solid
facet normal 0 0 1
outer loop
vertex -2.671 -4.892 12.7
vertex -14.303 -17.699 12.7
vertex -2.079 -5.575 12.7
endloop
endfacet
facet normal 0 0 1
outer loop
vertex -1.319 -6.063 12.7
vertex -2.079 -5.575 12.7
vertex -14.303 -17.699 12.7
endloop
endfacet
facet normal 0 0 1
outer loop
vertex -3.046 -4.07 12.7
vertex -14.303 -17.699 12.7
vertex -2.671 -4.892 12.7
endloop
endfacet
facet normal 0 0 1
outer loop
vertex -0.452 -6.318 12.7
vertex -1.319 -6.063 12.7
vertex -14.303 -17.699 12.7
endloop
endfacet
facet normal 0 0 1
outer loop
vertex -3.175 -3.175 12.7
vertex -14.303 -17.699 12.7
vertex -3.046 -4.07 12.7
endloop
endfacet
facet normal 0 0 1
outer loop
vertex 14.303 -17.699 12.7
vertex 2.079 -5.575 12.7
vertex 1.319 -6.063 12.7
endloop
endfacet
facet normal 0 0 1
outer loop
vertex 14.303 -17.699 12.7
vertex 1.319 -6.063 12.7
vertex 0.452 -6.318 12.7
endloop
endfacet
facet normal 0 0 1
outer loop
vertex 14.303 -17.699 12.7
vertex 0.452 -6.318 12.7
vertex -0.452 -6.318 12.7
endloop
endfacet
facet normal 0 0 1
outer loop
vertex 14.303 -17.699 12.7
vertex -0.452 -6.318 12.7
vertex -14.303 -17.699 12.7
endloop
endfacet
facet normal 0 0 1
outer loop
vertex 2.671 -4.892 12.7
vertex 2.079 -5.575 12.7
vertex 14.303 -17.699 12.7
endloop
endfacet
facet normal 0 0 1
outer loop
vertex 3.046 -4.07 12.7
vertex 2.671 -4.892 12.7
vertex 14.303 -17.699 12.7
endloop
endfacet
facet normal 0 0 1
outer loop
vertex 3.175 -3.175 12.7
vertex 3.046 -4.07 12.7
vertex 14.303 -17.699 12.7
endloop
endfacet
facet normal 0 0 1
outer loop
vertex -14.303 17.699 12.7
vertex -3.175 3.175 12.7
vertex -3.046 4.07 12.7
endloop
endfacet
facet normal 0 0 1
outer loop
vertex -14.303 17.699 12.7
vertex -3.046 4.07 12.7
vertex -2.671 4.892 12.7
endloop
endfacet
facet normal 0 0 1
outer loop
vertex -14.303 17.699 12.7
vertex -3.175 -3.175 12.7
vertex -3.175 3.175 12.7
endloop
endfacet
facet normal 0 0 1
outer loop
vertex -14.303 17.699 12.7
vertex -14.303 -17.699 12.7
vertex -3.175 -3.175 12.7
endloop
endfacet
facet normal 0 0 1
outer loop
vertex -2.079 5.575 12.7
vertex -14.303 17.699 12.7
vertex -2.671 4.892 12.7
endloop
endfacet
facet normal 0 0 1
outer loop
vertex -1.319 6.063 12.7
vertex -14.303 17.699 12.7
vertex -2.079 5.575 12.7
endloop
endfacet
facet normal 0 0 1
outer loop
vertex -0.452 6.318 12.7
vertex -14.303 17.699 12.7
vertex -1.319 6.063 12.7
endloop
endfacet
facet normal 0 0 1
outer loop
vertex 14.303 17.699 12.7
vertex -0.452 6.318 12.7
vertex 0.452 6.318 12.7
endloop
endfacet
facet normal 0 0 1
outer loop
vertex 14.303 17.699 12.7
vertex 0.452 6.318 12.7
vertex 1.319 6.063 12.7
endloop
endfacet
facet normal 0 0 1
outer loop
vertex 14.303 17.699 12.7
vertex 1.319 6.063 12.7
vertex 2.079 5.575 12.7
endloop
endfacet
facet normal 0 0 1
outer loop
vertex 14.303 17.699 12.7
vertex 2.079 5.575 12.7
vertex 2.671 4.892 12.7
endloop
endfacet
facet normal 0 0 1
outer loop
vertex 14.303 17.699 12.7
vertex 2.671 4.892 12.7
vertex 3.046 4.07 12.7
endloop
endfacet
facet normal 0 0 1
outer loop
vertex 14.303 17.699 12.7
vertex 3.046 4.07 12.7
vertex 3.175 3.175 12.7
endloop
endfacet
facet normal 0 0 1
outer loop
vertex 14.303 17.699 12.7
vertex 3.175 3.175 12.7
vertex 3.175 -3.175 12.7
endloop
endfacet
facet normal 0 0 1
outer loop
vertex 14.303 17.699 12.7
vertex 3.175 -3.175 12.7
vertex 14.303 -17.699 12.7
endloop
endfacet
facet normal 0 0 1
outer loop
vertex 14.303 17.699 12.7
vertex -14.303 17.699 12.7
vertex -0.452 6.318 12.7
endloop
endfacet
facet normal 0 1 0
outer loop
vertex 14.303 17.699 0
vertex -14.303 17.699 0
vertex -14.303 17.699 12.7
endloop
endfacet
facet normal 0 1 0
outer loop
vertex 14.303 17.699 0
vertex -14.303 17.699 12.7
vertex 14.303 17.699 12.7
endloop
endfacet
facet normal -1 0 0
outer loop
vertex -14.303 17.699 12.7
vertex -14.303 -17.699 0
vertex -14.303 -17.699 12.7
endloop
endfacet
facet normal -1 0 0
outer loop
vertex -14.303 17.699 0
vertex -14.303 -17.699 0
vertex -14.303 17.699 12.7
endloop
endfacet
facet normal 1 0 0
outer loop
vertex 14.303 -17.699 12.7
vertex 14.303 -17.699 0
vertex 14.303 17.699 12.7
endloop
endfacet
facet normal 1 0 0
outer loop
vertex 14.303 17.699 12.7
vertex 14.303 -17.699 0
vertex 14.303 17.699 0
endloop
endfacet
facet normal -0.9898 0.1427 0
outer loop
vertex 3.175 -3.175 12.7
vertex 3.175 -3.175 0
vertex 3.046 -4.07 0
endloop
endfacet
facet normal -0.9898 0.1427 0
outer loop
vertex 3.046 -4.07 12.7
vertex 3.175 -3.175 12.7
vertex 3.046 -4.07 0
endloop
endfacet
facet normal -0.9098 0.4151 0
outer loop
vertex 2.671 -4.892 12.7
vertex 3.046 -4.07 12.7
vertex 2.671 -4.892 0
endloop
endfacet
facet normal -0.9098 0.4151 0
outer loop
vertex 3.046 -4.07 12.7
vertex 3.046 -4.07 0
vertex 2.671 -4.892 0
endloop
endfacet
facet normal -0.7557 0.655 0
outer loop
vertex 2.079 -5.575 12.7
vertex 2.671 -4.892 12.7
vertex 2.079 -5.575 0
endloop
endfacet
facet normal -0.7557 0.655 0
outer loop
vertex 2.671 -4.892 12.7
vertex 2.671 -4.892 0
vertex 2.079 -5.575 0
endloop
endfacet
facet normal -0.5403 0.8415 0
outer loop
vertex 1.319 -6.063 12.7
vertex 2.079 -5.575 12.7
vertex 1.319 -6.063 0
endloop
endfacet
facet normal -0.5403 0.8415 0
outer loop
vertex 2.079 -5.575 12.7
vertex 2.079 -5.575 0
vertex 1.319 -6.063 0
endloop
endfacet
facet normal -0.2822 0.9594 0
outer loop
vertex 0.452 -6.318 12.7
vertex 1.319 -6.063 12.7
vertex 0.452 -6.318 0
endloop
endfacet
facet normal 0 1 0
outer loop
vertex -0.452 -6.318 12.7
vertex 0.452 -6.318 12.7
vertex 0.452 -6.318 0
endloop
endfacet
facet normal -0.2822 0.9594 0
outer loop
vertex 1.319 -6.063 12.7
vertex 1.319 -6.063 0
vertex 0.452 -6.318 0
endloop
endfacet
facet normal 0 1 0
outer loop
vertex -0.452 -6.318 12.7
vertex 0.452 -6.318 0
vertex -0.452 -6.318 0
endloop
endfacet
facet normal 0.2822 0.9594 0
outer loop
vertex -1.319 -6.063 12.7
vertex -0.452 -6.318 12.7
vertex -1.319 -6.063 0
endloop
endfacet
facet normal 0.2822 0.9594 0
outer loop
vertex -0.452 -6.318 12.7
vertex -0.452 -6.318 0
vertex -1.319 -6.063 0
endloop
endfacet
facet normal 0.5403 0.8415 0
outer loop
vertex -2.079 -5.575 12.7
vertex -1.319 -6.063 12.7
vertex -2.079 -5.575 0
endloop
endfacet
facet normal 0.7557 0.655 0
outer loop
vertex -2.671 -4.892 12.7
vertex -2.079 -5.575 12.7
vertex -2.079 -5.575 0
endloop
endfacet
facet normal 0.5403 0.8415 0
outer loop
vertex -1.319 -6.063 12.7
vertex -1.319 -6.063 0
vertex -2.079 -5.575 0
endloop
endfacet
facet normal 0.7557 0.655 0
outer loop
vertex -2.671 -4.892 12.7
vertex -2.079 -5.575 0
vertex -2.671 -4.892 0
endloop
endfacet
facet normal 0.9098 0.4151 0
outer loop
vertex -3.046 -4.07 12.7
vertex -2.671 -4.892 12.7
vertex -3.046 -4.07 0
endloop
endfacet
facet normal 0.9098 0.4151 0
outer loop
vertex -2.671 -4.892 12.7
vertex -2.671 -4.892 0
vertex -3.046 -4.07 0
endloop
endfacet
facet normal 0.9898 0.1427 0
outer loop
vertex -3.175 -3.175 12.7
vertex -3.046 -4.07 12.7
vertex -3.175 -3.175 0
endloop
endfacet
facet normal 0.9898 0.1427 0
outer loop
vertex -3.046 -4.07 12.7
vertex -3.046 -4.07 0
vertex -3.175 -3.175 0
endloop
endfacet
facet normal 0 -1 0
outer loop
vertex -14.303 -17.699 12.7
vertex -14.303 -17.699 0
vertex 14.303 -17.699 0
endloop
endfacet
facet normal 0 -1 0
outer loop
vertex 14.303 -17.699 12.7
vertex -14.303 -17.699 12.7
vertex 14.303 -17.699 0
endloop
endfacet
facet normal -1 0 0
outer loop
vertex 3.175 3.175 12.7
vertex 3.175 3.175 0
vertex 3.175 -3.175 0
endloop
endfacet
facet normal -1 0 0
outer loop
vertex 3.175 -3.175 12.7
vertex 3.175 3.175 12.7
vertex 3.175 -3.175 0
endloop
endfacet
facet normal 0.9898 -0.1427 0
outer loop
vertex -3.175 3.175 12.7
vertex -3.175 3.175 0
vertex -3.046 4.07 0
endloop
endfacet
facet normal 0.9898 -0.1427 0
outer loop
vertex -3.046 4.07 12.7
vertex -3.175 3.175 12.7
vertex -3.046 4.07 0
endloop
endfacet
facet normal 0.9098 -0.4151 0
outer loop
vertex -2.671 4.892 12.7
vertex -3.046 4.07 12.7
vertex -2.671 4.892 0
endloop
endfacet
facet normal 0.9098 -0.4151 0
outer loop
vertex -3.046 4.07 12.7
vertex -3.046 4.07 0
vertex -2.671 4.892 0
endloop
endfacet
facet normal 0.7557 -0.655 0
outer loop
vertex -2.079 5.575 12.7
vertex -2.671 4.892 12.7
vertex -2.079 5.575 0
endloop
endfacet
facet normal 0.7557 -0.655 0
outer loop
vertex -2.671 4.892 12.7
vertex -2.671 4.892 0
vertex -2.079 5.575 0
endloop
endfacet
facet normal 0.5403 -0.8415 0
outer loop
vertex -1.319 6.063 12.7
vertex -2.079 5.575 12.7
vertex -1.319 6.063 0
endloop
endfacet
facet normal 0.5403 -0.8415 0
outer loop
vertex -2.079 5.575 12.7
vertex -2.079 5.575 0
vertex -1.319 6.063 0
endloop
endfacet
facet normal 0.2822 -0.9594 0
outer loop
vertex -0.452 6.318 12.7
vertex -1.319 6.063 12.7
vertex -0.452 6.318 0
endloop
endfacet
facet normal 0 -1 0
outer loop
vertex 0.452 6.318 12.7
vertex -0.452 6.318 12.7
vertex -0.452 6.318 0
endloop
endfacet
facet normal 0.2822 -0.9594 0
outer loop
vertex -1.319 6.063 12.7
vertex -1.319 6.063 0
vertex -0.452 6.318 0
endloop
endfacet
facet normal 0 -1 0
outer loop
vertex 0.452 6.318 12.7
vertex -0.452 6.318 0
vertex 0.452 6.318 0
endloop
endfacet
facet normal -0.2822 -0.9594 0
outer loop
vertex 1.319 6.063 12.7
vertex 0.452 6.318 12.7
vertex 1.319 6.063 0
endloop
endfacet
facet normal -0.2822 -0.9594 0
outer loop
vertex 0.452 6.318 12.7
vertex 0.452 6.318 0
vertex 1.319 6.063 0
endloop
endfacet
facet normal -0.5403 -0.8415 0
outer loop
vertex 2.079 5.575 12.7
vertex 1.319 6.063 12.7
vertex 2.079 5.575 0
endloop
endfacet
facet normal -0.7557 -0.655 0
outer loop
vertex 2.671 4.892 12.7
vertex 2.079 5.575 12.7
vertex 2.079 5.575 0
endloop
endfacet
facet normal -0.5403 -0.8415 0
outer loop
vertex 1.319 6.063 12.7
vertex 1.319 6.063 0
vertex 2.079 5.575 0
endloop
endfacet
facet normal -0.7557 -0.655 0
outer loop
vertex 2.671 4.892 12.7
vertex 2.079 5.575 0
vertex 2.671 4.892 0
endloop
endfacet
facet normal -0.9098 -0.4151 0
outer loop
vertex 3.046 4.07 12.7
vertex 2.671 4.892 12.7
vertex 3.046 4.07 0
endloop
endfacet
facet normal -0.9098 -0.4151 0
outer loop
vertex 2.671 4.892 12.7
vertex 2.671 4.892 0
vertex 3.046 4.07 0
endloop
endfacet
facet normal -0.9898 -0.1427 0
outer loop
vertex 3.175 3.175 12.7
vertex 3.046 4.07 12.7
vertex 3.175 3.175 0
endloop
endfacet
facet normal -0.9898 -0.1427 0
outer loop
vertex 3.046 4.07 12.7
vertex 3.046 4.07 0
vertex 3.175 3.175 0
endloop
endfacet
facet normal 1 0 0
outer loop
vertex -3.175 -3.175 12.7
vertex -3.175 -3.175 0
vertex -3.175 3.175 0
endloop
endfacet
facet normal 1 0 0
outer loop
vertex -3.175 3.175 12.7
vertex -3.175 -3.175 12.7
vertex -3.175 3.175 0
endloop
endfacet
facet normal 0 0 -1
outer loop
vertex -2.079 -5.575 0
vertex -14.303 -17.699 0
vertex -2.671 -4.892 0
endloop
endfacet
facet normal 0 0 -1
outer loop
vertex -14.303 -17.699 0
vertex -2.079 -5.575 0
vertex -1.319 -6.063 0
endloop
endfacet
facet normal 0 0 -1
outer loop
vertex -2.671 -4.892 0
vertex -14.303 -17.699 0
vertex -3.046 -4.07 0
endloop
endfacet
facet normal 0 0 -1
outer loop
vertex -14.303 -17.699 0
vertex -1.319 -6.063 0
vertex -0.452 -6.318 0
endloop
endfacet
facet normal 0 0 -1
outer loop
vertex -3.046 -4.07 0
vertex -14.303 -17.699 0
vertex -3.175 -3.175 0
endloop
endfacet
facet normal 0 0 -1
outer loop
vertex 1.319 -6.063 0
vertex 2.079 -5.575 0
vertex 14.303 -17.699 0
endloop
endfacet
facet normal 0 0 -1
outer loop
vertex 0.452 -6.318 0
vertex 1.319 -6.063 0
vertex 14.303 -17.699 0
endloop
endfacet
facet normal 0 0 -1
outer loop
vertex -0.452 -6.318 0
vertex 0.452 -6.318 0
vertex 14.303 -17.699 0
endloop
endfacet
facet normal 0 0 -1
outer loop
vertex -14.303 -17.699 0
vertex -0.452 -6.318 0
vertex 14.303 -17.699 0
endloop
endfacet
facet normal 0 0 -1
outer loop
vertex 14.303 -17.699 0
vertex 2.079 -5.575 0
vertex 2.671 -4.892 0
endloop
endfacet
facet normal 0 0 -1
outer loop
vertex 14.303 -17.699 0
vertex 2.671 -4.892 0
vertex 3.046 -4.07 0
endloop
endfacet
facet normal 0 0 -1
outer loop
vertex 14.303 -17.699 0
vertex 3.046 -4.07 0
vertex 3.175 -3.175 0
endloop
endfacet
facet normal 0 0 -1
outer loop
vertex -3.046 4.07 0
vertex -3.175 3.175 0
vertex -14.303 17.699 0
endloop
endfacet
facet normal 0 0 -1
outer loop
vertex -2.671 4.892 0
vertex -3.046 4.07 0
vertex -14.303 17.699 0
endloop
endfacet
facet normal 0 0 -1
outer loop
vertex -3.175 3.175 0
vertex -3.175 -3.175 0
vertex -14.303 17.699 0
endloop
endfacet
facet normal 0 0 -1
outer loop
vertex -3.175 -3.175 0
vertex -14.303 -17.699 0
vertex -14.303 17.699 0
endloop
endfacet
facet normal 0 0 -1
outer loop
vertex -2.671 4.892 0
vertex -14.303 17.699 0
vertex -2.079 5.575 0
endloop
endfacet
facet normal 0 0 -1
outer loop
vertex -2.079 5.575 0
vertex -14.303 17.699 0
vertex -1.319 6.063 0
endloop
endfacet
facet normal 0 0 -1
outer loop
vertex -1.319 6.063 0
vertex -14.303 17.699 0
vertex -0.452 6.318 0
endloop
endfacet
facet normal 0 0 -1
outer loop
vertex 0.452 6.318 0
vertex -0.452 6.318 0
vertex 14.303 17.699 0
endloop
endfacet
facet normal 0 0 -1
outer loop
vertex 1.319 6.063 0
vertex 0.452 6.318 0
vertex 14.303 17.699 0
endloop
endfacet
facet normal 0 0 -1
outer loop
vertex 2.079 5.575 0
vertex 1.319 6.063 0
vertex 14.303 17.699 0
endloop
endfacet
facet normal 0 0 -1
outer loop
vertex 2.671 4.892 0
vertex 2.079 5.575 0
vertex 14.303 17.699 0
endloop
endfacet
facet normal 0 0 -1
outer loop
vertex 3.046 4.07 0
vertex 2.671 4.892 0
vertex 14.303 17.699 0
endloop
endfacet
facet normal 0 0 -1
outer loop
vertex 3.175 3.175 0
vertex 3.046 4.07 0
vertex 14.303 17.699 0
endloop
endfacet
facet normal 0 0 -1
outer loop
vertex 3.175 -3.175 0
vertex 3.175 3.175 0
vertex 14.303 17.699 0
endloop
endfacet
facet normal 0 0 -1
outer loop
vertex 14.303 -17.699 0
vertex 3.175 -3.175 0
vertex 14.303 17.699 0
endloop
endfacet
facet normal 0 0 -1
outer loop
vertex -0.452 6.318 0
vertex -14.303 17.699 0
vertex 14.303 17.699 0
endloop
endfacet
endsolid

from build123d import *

# Parameters (mm, degrees)
F0_W     = 28.606172
F0_H     = 35.397082
F1_DEPTH = 12.7


with BuildPart() as f1:
    # F0 (on Top) → F1 (new body)
    with BuildSketch(Plane.XY):
        Rectangle(F0_W, F0_H)
        with BuildLine():
            Line((3.175, 3.175), (3.175, -3.175))
            ThreePointArc((3.175, -3.175), (0, -6.35), (-3.175, -3.175))
            Line((-3.175, -3.175), (-3.175, 3.175))
            ThreePointArc((-3.175, 3.175), (0, 6.35), (3.175, 3.175))
        make_face(mode=Mode.SUBTRACT)
    extrude(amount=F1_DEPTH)


solid = f1.part
